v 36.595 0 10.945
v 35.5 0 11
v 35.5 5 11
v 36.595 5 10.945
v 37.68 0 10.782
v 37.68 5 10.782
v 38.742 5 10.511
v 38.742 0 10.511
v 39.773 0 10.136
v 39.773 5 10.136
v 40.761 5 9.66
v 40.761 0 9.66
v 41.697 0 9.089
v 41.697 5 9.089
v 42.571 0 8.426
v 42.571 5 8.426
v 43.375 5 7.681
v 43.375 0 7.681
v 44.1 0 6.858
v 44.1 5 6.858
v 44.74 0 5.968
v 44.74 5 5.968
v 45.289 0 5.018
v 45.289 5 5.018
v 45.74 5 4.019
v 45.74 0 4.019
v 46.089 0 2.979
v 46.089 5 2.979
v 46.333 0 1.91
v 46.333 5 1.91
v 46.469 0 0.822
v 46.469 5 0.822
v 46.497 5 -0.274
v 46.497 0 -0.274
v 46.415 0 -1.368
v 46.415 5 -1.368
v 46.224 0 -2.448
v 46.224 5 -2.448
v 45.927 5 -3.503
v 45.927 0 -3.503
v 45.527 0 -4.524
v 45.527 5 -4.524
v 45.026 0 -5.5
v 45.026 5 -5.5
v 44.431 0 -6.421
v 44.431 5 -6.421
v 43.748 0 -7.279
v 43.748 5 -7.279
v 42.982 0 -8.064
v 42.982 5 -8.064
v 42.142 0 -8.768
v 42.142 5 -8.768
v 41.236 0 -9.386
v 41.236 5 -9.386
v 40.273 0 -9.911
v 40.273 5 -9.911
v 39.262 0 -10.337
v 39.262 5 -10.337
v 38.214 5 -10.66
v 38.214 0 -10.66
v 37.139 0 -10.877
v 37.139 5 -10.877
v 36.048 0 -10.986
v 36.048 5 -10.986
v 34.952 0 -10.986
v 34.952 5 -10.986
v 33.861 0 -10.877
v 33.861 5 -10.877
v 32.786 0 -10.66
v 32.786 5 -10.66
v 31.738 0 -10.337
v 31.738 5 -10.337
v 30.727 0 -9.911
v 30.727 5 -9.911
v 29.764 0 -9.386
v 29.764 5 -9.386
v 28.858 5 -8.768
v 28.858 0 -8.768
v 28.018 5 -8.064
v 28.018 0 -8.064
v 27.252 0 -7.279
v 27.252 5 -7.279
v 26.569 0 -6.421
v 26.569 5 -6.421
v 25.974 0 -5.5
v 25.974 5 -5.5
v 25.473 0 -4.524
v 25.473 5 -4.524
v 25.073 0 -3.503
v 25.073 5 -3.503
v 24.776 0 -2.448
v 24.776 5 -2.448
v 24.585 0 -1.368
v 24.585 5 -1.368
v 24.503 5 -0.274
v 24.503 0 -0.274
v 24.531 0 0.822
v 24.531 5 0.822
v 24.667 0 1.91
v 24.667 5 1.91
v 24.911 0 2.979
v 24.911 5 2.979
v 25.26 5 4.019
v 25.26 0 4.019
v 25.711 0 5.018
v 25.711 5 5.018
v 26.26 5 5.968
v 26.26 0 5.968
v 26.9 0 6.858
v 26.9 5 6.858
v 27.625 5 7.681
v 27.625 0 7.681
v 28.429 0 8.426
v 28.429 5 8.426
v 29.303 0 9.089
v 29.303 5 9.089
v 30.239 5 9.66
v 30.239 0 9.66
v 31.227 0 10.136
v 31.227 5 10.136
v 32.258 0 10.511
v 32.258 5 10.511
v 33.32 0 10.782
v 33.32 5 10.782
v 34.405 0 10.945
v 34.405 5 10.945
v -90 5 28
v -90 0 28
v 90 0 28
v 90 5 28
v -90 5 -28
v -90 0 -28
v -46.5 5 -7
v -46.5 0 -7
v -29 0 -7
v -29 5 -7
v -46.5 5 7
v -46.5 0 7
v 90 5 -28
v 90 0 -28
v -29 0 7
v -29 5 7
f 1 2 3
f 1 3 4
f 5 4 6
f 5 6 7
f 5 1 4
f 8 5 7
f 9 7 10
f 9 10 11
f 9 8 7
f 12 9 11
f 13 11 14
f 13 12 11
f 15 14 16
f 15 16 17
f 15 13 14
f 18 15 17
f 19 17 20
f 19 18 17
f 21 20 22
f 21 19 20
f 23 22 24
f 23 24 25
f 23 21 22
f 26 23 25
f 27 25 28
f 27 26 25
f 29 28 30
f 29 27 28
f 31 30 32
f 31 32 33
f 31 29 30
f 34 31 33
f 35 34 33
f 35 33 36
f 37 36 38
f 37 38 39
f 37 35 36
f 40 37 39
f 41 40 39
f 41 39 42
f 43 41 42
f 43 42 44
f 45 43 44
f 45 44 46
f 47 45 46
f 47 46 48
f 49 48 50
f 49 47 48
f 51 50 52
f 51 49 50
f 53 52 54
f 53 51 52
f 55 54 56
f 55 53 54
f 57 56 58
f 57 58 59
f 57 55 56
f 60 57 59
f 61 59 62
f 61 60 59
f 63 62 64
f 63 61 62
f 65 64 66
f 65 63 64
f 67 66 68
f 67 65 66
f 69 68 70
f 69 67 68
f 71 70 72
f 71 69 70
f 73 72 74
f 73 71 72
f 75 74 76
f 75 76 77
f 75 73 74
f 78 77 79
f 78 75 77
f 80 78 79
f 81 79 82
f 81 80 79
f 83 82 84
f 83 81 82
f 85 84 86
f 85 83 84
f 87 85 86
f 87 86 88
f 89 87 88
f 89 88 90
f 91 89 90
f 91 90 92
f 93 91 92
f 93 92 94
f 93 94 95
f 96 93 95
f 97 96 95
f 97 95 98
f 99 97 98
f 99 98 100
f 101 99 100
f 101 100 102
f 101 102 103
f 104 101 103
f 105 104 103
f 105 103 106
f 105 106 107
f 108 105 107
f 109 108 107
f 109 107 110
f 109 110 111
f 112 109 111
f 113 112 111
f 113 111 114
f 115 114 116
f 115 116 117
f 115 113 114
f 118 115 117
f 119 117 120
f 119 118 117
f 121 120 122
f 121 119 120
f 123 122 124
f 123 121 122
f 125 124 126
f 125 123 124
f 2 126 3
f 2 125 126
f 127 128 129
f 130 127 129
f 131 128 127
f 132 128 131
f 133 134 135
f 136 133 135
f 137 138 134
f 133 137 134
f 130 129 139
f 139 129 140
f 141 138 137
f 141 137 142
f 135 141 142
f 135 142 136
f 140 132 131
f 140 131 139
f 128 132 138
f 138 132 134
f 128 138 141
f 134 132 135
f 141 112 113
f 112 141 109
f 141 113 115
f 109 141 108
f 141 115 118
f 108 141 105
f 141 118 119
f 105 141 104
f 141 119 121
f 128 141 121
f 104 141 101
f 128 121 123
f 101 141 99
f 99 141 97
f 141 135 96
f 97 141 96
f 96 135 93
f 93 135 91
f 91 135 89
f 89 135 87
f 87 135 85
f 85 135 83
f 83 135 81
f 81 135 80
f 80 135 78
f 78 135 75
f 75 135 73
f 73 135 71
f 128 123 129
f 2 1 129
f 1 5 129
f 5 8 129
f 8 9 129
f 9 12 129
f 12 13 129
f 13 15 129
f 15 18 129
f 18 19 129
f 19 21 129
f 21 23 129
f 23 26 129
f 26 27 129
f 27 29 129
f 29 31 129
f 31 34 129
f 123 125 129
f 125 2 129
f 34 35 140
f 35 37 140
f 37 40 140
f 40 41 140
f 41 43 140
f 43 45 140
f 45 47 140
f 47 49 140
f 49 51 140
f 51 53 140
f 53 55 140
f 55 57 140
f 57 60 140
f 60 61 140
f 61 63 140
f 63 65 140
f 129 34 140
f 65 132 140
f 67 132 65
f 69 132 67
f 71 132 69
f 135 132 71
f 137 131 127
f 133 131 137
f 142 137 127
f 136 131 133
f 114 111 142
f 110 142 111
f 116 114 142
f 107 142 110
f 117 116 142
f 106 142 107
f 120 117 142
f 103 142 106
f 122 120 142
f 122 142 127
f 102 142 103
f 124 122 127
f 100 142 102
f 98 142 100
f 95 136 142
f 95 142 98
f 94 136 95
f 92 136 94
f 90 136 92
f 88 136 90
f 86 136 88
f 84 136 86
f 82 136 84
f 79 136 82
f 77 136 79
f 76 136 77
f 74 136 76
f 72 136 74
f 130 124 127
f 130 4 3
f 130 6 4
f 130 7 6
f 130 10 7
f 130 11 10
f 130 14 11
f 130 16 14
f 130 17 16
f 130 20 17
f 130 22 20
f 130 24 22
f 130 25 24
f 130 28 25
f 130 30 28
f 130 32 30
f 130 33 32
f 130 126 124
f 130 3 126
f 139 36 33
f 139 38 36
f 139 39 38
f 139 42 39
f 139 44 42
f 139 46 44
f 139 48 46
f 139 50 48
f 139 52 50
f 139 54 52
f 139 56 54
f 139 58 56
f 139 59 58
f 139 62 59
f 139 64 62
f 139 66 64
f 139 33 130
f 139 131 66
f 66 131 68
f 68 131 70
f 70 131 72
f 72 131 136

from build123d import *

# Parameters (mm, degrees)
IZIM1_W                     = 180
IZIM1_H                     = 56
IZIM1_R                     = 11
IZIM1_W_2                   = 17.5
IZIM1_H_2                   = 14
Y_KSEKLIK_EKSTR_ZYON1_DEPTH = 5


with BuildPart() as part:
    # Çizim1 → Yükseklik-Ekstrüzyon1 (new body)
    with BuildSketch(Plane(origin=(0, 0, 0), x_dir=(1, 0, 0), z_dir=(0, 1, 0))):
        Rectangle(IZIM1_W, IZIM1_H)
        with Locations(Location((35.5, 0, 0), (0, 0, 270))):
            Circle(IZIM1_R, mode=Mode.SUBTRACT)
        with Locations((-37.75, 0)):
            Rectangle(IZIM1_W_2, IZIM1_H_2, mode=Mode.SUBTRACT)
    extrude(amount=Y_KSEKLIK_EKSTR_ZYON1_DEPTH)


solid = part.part
